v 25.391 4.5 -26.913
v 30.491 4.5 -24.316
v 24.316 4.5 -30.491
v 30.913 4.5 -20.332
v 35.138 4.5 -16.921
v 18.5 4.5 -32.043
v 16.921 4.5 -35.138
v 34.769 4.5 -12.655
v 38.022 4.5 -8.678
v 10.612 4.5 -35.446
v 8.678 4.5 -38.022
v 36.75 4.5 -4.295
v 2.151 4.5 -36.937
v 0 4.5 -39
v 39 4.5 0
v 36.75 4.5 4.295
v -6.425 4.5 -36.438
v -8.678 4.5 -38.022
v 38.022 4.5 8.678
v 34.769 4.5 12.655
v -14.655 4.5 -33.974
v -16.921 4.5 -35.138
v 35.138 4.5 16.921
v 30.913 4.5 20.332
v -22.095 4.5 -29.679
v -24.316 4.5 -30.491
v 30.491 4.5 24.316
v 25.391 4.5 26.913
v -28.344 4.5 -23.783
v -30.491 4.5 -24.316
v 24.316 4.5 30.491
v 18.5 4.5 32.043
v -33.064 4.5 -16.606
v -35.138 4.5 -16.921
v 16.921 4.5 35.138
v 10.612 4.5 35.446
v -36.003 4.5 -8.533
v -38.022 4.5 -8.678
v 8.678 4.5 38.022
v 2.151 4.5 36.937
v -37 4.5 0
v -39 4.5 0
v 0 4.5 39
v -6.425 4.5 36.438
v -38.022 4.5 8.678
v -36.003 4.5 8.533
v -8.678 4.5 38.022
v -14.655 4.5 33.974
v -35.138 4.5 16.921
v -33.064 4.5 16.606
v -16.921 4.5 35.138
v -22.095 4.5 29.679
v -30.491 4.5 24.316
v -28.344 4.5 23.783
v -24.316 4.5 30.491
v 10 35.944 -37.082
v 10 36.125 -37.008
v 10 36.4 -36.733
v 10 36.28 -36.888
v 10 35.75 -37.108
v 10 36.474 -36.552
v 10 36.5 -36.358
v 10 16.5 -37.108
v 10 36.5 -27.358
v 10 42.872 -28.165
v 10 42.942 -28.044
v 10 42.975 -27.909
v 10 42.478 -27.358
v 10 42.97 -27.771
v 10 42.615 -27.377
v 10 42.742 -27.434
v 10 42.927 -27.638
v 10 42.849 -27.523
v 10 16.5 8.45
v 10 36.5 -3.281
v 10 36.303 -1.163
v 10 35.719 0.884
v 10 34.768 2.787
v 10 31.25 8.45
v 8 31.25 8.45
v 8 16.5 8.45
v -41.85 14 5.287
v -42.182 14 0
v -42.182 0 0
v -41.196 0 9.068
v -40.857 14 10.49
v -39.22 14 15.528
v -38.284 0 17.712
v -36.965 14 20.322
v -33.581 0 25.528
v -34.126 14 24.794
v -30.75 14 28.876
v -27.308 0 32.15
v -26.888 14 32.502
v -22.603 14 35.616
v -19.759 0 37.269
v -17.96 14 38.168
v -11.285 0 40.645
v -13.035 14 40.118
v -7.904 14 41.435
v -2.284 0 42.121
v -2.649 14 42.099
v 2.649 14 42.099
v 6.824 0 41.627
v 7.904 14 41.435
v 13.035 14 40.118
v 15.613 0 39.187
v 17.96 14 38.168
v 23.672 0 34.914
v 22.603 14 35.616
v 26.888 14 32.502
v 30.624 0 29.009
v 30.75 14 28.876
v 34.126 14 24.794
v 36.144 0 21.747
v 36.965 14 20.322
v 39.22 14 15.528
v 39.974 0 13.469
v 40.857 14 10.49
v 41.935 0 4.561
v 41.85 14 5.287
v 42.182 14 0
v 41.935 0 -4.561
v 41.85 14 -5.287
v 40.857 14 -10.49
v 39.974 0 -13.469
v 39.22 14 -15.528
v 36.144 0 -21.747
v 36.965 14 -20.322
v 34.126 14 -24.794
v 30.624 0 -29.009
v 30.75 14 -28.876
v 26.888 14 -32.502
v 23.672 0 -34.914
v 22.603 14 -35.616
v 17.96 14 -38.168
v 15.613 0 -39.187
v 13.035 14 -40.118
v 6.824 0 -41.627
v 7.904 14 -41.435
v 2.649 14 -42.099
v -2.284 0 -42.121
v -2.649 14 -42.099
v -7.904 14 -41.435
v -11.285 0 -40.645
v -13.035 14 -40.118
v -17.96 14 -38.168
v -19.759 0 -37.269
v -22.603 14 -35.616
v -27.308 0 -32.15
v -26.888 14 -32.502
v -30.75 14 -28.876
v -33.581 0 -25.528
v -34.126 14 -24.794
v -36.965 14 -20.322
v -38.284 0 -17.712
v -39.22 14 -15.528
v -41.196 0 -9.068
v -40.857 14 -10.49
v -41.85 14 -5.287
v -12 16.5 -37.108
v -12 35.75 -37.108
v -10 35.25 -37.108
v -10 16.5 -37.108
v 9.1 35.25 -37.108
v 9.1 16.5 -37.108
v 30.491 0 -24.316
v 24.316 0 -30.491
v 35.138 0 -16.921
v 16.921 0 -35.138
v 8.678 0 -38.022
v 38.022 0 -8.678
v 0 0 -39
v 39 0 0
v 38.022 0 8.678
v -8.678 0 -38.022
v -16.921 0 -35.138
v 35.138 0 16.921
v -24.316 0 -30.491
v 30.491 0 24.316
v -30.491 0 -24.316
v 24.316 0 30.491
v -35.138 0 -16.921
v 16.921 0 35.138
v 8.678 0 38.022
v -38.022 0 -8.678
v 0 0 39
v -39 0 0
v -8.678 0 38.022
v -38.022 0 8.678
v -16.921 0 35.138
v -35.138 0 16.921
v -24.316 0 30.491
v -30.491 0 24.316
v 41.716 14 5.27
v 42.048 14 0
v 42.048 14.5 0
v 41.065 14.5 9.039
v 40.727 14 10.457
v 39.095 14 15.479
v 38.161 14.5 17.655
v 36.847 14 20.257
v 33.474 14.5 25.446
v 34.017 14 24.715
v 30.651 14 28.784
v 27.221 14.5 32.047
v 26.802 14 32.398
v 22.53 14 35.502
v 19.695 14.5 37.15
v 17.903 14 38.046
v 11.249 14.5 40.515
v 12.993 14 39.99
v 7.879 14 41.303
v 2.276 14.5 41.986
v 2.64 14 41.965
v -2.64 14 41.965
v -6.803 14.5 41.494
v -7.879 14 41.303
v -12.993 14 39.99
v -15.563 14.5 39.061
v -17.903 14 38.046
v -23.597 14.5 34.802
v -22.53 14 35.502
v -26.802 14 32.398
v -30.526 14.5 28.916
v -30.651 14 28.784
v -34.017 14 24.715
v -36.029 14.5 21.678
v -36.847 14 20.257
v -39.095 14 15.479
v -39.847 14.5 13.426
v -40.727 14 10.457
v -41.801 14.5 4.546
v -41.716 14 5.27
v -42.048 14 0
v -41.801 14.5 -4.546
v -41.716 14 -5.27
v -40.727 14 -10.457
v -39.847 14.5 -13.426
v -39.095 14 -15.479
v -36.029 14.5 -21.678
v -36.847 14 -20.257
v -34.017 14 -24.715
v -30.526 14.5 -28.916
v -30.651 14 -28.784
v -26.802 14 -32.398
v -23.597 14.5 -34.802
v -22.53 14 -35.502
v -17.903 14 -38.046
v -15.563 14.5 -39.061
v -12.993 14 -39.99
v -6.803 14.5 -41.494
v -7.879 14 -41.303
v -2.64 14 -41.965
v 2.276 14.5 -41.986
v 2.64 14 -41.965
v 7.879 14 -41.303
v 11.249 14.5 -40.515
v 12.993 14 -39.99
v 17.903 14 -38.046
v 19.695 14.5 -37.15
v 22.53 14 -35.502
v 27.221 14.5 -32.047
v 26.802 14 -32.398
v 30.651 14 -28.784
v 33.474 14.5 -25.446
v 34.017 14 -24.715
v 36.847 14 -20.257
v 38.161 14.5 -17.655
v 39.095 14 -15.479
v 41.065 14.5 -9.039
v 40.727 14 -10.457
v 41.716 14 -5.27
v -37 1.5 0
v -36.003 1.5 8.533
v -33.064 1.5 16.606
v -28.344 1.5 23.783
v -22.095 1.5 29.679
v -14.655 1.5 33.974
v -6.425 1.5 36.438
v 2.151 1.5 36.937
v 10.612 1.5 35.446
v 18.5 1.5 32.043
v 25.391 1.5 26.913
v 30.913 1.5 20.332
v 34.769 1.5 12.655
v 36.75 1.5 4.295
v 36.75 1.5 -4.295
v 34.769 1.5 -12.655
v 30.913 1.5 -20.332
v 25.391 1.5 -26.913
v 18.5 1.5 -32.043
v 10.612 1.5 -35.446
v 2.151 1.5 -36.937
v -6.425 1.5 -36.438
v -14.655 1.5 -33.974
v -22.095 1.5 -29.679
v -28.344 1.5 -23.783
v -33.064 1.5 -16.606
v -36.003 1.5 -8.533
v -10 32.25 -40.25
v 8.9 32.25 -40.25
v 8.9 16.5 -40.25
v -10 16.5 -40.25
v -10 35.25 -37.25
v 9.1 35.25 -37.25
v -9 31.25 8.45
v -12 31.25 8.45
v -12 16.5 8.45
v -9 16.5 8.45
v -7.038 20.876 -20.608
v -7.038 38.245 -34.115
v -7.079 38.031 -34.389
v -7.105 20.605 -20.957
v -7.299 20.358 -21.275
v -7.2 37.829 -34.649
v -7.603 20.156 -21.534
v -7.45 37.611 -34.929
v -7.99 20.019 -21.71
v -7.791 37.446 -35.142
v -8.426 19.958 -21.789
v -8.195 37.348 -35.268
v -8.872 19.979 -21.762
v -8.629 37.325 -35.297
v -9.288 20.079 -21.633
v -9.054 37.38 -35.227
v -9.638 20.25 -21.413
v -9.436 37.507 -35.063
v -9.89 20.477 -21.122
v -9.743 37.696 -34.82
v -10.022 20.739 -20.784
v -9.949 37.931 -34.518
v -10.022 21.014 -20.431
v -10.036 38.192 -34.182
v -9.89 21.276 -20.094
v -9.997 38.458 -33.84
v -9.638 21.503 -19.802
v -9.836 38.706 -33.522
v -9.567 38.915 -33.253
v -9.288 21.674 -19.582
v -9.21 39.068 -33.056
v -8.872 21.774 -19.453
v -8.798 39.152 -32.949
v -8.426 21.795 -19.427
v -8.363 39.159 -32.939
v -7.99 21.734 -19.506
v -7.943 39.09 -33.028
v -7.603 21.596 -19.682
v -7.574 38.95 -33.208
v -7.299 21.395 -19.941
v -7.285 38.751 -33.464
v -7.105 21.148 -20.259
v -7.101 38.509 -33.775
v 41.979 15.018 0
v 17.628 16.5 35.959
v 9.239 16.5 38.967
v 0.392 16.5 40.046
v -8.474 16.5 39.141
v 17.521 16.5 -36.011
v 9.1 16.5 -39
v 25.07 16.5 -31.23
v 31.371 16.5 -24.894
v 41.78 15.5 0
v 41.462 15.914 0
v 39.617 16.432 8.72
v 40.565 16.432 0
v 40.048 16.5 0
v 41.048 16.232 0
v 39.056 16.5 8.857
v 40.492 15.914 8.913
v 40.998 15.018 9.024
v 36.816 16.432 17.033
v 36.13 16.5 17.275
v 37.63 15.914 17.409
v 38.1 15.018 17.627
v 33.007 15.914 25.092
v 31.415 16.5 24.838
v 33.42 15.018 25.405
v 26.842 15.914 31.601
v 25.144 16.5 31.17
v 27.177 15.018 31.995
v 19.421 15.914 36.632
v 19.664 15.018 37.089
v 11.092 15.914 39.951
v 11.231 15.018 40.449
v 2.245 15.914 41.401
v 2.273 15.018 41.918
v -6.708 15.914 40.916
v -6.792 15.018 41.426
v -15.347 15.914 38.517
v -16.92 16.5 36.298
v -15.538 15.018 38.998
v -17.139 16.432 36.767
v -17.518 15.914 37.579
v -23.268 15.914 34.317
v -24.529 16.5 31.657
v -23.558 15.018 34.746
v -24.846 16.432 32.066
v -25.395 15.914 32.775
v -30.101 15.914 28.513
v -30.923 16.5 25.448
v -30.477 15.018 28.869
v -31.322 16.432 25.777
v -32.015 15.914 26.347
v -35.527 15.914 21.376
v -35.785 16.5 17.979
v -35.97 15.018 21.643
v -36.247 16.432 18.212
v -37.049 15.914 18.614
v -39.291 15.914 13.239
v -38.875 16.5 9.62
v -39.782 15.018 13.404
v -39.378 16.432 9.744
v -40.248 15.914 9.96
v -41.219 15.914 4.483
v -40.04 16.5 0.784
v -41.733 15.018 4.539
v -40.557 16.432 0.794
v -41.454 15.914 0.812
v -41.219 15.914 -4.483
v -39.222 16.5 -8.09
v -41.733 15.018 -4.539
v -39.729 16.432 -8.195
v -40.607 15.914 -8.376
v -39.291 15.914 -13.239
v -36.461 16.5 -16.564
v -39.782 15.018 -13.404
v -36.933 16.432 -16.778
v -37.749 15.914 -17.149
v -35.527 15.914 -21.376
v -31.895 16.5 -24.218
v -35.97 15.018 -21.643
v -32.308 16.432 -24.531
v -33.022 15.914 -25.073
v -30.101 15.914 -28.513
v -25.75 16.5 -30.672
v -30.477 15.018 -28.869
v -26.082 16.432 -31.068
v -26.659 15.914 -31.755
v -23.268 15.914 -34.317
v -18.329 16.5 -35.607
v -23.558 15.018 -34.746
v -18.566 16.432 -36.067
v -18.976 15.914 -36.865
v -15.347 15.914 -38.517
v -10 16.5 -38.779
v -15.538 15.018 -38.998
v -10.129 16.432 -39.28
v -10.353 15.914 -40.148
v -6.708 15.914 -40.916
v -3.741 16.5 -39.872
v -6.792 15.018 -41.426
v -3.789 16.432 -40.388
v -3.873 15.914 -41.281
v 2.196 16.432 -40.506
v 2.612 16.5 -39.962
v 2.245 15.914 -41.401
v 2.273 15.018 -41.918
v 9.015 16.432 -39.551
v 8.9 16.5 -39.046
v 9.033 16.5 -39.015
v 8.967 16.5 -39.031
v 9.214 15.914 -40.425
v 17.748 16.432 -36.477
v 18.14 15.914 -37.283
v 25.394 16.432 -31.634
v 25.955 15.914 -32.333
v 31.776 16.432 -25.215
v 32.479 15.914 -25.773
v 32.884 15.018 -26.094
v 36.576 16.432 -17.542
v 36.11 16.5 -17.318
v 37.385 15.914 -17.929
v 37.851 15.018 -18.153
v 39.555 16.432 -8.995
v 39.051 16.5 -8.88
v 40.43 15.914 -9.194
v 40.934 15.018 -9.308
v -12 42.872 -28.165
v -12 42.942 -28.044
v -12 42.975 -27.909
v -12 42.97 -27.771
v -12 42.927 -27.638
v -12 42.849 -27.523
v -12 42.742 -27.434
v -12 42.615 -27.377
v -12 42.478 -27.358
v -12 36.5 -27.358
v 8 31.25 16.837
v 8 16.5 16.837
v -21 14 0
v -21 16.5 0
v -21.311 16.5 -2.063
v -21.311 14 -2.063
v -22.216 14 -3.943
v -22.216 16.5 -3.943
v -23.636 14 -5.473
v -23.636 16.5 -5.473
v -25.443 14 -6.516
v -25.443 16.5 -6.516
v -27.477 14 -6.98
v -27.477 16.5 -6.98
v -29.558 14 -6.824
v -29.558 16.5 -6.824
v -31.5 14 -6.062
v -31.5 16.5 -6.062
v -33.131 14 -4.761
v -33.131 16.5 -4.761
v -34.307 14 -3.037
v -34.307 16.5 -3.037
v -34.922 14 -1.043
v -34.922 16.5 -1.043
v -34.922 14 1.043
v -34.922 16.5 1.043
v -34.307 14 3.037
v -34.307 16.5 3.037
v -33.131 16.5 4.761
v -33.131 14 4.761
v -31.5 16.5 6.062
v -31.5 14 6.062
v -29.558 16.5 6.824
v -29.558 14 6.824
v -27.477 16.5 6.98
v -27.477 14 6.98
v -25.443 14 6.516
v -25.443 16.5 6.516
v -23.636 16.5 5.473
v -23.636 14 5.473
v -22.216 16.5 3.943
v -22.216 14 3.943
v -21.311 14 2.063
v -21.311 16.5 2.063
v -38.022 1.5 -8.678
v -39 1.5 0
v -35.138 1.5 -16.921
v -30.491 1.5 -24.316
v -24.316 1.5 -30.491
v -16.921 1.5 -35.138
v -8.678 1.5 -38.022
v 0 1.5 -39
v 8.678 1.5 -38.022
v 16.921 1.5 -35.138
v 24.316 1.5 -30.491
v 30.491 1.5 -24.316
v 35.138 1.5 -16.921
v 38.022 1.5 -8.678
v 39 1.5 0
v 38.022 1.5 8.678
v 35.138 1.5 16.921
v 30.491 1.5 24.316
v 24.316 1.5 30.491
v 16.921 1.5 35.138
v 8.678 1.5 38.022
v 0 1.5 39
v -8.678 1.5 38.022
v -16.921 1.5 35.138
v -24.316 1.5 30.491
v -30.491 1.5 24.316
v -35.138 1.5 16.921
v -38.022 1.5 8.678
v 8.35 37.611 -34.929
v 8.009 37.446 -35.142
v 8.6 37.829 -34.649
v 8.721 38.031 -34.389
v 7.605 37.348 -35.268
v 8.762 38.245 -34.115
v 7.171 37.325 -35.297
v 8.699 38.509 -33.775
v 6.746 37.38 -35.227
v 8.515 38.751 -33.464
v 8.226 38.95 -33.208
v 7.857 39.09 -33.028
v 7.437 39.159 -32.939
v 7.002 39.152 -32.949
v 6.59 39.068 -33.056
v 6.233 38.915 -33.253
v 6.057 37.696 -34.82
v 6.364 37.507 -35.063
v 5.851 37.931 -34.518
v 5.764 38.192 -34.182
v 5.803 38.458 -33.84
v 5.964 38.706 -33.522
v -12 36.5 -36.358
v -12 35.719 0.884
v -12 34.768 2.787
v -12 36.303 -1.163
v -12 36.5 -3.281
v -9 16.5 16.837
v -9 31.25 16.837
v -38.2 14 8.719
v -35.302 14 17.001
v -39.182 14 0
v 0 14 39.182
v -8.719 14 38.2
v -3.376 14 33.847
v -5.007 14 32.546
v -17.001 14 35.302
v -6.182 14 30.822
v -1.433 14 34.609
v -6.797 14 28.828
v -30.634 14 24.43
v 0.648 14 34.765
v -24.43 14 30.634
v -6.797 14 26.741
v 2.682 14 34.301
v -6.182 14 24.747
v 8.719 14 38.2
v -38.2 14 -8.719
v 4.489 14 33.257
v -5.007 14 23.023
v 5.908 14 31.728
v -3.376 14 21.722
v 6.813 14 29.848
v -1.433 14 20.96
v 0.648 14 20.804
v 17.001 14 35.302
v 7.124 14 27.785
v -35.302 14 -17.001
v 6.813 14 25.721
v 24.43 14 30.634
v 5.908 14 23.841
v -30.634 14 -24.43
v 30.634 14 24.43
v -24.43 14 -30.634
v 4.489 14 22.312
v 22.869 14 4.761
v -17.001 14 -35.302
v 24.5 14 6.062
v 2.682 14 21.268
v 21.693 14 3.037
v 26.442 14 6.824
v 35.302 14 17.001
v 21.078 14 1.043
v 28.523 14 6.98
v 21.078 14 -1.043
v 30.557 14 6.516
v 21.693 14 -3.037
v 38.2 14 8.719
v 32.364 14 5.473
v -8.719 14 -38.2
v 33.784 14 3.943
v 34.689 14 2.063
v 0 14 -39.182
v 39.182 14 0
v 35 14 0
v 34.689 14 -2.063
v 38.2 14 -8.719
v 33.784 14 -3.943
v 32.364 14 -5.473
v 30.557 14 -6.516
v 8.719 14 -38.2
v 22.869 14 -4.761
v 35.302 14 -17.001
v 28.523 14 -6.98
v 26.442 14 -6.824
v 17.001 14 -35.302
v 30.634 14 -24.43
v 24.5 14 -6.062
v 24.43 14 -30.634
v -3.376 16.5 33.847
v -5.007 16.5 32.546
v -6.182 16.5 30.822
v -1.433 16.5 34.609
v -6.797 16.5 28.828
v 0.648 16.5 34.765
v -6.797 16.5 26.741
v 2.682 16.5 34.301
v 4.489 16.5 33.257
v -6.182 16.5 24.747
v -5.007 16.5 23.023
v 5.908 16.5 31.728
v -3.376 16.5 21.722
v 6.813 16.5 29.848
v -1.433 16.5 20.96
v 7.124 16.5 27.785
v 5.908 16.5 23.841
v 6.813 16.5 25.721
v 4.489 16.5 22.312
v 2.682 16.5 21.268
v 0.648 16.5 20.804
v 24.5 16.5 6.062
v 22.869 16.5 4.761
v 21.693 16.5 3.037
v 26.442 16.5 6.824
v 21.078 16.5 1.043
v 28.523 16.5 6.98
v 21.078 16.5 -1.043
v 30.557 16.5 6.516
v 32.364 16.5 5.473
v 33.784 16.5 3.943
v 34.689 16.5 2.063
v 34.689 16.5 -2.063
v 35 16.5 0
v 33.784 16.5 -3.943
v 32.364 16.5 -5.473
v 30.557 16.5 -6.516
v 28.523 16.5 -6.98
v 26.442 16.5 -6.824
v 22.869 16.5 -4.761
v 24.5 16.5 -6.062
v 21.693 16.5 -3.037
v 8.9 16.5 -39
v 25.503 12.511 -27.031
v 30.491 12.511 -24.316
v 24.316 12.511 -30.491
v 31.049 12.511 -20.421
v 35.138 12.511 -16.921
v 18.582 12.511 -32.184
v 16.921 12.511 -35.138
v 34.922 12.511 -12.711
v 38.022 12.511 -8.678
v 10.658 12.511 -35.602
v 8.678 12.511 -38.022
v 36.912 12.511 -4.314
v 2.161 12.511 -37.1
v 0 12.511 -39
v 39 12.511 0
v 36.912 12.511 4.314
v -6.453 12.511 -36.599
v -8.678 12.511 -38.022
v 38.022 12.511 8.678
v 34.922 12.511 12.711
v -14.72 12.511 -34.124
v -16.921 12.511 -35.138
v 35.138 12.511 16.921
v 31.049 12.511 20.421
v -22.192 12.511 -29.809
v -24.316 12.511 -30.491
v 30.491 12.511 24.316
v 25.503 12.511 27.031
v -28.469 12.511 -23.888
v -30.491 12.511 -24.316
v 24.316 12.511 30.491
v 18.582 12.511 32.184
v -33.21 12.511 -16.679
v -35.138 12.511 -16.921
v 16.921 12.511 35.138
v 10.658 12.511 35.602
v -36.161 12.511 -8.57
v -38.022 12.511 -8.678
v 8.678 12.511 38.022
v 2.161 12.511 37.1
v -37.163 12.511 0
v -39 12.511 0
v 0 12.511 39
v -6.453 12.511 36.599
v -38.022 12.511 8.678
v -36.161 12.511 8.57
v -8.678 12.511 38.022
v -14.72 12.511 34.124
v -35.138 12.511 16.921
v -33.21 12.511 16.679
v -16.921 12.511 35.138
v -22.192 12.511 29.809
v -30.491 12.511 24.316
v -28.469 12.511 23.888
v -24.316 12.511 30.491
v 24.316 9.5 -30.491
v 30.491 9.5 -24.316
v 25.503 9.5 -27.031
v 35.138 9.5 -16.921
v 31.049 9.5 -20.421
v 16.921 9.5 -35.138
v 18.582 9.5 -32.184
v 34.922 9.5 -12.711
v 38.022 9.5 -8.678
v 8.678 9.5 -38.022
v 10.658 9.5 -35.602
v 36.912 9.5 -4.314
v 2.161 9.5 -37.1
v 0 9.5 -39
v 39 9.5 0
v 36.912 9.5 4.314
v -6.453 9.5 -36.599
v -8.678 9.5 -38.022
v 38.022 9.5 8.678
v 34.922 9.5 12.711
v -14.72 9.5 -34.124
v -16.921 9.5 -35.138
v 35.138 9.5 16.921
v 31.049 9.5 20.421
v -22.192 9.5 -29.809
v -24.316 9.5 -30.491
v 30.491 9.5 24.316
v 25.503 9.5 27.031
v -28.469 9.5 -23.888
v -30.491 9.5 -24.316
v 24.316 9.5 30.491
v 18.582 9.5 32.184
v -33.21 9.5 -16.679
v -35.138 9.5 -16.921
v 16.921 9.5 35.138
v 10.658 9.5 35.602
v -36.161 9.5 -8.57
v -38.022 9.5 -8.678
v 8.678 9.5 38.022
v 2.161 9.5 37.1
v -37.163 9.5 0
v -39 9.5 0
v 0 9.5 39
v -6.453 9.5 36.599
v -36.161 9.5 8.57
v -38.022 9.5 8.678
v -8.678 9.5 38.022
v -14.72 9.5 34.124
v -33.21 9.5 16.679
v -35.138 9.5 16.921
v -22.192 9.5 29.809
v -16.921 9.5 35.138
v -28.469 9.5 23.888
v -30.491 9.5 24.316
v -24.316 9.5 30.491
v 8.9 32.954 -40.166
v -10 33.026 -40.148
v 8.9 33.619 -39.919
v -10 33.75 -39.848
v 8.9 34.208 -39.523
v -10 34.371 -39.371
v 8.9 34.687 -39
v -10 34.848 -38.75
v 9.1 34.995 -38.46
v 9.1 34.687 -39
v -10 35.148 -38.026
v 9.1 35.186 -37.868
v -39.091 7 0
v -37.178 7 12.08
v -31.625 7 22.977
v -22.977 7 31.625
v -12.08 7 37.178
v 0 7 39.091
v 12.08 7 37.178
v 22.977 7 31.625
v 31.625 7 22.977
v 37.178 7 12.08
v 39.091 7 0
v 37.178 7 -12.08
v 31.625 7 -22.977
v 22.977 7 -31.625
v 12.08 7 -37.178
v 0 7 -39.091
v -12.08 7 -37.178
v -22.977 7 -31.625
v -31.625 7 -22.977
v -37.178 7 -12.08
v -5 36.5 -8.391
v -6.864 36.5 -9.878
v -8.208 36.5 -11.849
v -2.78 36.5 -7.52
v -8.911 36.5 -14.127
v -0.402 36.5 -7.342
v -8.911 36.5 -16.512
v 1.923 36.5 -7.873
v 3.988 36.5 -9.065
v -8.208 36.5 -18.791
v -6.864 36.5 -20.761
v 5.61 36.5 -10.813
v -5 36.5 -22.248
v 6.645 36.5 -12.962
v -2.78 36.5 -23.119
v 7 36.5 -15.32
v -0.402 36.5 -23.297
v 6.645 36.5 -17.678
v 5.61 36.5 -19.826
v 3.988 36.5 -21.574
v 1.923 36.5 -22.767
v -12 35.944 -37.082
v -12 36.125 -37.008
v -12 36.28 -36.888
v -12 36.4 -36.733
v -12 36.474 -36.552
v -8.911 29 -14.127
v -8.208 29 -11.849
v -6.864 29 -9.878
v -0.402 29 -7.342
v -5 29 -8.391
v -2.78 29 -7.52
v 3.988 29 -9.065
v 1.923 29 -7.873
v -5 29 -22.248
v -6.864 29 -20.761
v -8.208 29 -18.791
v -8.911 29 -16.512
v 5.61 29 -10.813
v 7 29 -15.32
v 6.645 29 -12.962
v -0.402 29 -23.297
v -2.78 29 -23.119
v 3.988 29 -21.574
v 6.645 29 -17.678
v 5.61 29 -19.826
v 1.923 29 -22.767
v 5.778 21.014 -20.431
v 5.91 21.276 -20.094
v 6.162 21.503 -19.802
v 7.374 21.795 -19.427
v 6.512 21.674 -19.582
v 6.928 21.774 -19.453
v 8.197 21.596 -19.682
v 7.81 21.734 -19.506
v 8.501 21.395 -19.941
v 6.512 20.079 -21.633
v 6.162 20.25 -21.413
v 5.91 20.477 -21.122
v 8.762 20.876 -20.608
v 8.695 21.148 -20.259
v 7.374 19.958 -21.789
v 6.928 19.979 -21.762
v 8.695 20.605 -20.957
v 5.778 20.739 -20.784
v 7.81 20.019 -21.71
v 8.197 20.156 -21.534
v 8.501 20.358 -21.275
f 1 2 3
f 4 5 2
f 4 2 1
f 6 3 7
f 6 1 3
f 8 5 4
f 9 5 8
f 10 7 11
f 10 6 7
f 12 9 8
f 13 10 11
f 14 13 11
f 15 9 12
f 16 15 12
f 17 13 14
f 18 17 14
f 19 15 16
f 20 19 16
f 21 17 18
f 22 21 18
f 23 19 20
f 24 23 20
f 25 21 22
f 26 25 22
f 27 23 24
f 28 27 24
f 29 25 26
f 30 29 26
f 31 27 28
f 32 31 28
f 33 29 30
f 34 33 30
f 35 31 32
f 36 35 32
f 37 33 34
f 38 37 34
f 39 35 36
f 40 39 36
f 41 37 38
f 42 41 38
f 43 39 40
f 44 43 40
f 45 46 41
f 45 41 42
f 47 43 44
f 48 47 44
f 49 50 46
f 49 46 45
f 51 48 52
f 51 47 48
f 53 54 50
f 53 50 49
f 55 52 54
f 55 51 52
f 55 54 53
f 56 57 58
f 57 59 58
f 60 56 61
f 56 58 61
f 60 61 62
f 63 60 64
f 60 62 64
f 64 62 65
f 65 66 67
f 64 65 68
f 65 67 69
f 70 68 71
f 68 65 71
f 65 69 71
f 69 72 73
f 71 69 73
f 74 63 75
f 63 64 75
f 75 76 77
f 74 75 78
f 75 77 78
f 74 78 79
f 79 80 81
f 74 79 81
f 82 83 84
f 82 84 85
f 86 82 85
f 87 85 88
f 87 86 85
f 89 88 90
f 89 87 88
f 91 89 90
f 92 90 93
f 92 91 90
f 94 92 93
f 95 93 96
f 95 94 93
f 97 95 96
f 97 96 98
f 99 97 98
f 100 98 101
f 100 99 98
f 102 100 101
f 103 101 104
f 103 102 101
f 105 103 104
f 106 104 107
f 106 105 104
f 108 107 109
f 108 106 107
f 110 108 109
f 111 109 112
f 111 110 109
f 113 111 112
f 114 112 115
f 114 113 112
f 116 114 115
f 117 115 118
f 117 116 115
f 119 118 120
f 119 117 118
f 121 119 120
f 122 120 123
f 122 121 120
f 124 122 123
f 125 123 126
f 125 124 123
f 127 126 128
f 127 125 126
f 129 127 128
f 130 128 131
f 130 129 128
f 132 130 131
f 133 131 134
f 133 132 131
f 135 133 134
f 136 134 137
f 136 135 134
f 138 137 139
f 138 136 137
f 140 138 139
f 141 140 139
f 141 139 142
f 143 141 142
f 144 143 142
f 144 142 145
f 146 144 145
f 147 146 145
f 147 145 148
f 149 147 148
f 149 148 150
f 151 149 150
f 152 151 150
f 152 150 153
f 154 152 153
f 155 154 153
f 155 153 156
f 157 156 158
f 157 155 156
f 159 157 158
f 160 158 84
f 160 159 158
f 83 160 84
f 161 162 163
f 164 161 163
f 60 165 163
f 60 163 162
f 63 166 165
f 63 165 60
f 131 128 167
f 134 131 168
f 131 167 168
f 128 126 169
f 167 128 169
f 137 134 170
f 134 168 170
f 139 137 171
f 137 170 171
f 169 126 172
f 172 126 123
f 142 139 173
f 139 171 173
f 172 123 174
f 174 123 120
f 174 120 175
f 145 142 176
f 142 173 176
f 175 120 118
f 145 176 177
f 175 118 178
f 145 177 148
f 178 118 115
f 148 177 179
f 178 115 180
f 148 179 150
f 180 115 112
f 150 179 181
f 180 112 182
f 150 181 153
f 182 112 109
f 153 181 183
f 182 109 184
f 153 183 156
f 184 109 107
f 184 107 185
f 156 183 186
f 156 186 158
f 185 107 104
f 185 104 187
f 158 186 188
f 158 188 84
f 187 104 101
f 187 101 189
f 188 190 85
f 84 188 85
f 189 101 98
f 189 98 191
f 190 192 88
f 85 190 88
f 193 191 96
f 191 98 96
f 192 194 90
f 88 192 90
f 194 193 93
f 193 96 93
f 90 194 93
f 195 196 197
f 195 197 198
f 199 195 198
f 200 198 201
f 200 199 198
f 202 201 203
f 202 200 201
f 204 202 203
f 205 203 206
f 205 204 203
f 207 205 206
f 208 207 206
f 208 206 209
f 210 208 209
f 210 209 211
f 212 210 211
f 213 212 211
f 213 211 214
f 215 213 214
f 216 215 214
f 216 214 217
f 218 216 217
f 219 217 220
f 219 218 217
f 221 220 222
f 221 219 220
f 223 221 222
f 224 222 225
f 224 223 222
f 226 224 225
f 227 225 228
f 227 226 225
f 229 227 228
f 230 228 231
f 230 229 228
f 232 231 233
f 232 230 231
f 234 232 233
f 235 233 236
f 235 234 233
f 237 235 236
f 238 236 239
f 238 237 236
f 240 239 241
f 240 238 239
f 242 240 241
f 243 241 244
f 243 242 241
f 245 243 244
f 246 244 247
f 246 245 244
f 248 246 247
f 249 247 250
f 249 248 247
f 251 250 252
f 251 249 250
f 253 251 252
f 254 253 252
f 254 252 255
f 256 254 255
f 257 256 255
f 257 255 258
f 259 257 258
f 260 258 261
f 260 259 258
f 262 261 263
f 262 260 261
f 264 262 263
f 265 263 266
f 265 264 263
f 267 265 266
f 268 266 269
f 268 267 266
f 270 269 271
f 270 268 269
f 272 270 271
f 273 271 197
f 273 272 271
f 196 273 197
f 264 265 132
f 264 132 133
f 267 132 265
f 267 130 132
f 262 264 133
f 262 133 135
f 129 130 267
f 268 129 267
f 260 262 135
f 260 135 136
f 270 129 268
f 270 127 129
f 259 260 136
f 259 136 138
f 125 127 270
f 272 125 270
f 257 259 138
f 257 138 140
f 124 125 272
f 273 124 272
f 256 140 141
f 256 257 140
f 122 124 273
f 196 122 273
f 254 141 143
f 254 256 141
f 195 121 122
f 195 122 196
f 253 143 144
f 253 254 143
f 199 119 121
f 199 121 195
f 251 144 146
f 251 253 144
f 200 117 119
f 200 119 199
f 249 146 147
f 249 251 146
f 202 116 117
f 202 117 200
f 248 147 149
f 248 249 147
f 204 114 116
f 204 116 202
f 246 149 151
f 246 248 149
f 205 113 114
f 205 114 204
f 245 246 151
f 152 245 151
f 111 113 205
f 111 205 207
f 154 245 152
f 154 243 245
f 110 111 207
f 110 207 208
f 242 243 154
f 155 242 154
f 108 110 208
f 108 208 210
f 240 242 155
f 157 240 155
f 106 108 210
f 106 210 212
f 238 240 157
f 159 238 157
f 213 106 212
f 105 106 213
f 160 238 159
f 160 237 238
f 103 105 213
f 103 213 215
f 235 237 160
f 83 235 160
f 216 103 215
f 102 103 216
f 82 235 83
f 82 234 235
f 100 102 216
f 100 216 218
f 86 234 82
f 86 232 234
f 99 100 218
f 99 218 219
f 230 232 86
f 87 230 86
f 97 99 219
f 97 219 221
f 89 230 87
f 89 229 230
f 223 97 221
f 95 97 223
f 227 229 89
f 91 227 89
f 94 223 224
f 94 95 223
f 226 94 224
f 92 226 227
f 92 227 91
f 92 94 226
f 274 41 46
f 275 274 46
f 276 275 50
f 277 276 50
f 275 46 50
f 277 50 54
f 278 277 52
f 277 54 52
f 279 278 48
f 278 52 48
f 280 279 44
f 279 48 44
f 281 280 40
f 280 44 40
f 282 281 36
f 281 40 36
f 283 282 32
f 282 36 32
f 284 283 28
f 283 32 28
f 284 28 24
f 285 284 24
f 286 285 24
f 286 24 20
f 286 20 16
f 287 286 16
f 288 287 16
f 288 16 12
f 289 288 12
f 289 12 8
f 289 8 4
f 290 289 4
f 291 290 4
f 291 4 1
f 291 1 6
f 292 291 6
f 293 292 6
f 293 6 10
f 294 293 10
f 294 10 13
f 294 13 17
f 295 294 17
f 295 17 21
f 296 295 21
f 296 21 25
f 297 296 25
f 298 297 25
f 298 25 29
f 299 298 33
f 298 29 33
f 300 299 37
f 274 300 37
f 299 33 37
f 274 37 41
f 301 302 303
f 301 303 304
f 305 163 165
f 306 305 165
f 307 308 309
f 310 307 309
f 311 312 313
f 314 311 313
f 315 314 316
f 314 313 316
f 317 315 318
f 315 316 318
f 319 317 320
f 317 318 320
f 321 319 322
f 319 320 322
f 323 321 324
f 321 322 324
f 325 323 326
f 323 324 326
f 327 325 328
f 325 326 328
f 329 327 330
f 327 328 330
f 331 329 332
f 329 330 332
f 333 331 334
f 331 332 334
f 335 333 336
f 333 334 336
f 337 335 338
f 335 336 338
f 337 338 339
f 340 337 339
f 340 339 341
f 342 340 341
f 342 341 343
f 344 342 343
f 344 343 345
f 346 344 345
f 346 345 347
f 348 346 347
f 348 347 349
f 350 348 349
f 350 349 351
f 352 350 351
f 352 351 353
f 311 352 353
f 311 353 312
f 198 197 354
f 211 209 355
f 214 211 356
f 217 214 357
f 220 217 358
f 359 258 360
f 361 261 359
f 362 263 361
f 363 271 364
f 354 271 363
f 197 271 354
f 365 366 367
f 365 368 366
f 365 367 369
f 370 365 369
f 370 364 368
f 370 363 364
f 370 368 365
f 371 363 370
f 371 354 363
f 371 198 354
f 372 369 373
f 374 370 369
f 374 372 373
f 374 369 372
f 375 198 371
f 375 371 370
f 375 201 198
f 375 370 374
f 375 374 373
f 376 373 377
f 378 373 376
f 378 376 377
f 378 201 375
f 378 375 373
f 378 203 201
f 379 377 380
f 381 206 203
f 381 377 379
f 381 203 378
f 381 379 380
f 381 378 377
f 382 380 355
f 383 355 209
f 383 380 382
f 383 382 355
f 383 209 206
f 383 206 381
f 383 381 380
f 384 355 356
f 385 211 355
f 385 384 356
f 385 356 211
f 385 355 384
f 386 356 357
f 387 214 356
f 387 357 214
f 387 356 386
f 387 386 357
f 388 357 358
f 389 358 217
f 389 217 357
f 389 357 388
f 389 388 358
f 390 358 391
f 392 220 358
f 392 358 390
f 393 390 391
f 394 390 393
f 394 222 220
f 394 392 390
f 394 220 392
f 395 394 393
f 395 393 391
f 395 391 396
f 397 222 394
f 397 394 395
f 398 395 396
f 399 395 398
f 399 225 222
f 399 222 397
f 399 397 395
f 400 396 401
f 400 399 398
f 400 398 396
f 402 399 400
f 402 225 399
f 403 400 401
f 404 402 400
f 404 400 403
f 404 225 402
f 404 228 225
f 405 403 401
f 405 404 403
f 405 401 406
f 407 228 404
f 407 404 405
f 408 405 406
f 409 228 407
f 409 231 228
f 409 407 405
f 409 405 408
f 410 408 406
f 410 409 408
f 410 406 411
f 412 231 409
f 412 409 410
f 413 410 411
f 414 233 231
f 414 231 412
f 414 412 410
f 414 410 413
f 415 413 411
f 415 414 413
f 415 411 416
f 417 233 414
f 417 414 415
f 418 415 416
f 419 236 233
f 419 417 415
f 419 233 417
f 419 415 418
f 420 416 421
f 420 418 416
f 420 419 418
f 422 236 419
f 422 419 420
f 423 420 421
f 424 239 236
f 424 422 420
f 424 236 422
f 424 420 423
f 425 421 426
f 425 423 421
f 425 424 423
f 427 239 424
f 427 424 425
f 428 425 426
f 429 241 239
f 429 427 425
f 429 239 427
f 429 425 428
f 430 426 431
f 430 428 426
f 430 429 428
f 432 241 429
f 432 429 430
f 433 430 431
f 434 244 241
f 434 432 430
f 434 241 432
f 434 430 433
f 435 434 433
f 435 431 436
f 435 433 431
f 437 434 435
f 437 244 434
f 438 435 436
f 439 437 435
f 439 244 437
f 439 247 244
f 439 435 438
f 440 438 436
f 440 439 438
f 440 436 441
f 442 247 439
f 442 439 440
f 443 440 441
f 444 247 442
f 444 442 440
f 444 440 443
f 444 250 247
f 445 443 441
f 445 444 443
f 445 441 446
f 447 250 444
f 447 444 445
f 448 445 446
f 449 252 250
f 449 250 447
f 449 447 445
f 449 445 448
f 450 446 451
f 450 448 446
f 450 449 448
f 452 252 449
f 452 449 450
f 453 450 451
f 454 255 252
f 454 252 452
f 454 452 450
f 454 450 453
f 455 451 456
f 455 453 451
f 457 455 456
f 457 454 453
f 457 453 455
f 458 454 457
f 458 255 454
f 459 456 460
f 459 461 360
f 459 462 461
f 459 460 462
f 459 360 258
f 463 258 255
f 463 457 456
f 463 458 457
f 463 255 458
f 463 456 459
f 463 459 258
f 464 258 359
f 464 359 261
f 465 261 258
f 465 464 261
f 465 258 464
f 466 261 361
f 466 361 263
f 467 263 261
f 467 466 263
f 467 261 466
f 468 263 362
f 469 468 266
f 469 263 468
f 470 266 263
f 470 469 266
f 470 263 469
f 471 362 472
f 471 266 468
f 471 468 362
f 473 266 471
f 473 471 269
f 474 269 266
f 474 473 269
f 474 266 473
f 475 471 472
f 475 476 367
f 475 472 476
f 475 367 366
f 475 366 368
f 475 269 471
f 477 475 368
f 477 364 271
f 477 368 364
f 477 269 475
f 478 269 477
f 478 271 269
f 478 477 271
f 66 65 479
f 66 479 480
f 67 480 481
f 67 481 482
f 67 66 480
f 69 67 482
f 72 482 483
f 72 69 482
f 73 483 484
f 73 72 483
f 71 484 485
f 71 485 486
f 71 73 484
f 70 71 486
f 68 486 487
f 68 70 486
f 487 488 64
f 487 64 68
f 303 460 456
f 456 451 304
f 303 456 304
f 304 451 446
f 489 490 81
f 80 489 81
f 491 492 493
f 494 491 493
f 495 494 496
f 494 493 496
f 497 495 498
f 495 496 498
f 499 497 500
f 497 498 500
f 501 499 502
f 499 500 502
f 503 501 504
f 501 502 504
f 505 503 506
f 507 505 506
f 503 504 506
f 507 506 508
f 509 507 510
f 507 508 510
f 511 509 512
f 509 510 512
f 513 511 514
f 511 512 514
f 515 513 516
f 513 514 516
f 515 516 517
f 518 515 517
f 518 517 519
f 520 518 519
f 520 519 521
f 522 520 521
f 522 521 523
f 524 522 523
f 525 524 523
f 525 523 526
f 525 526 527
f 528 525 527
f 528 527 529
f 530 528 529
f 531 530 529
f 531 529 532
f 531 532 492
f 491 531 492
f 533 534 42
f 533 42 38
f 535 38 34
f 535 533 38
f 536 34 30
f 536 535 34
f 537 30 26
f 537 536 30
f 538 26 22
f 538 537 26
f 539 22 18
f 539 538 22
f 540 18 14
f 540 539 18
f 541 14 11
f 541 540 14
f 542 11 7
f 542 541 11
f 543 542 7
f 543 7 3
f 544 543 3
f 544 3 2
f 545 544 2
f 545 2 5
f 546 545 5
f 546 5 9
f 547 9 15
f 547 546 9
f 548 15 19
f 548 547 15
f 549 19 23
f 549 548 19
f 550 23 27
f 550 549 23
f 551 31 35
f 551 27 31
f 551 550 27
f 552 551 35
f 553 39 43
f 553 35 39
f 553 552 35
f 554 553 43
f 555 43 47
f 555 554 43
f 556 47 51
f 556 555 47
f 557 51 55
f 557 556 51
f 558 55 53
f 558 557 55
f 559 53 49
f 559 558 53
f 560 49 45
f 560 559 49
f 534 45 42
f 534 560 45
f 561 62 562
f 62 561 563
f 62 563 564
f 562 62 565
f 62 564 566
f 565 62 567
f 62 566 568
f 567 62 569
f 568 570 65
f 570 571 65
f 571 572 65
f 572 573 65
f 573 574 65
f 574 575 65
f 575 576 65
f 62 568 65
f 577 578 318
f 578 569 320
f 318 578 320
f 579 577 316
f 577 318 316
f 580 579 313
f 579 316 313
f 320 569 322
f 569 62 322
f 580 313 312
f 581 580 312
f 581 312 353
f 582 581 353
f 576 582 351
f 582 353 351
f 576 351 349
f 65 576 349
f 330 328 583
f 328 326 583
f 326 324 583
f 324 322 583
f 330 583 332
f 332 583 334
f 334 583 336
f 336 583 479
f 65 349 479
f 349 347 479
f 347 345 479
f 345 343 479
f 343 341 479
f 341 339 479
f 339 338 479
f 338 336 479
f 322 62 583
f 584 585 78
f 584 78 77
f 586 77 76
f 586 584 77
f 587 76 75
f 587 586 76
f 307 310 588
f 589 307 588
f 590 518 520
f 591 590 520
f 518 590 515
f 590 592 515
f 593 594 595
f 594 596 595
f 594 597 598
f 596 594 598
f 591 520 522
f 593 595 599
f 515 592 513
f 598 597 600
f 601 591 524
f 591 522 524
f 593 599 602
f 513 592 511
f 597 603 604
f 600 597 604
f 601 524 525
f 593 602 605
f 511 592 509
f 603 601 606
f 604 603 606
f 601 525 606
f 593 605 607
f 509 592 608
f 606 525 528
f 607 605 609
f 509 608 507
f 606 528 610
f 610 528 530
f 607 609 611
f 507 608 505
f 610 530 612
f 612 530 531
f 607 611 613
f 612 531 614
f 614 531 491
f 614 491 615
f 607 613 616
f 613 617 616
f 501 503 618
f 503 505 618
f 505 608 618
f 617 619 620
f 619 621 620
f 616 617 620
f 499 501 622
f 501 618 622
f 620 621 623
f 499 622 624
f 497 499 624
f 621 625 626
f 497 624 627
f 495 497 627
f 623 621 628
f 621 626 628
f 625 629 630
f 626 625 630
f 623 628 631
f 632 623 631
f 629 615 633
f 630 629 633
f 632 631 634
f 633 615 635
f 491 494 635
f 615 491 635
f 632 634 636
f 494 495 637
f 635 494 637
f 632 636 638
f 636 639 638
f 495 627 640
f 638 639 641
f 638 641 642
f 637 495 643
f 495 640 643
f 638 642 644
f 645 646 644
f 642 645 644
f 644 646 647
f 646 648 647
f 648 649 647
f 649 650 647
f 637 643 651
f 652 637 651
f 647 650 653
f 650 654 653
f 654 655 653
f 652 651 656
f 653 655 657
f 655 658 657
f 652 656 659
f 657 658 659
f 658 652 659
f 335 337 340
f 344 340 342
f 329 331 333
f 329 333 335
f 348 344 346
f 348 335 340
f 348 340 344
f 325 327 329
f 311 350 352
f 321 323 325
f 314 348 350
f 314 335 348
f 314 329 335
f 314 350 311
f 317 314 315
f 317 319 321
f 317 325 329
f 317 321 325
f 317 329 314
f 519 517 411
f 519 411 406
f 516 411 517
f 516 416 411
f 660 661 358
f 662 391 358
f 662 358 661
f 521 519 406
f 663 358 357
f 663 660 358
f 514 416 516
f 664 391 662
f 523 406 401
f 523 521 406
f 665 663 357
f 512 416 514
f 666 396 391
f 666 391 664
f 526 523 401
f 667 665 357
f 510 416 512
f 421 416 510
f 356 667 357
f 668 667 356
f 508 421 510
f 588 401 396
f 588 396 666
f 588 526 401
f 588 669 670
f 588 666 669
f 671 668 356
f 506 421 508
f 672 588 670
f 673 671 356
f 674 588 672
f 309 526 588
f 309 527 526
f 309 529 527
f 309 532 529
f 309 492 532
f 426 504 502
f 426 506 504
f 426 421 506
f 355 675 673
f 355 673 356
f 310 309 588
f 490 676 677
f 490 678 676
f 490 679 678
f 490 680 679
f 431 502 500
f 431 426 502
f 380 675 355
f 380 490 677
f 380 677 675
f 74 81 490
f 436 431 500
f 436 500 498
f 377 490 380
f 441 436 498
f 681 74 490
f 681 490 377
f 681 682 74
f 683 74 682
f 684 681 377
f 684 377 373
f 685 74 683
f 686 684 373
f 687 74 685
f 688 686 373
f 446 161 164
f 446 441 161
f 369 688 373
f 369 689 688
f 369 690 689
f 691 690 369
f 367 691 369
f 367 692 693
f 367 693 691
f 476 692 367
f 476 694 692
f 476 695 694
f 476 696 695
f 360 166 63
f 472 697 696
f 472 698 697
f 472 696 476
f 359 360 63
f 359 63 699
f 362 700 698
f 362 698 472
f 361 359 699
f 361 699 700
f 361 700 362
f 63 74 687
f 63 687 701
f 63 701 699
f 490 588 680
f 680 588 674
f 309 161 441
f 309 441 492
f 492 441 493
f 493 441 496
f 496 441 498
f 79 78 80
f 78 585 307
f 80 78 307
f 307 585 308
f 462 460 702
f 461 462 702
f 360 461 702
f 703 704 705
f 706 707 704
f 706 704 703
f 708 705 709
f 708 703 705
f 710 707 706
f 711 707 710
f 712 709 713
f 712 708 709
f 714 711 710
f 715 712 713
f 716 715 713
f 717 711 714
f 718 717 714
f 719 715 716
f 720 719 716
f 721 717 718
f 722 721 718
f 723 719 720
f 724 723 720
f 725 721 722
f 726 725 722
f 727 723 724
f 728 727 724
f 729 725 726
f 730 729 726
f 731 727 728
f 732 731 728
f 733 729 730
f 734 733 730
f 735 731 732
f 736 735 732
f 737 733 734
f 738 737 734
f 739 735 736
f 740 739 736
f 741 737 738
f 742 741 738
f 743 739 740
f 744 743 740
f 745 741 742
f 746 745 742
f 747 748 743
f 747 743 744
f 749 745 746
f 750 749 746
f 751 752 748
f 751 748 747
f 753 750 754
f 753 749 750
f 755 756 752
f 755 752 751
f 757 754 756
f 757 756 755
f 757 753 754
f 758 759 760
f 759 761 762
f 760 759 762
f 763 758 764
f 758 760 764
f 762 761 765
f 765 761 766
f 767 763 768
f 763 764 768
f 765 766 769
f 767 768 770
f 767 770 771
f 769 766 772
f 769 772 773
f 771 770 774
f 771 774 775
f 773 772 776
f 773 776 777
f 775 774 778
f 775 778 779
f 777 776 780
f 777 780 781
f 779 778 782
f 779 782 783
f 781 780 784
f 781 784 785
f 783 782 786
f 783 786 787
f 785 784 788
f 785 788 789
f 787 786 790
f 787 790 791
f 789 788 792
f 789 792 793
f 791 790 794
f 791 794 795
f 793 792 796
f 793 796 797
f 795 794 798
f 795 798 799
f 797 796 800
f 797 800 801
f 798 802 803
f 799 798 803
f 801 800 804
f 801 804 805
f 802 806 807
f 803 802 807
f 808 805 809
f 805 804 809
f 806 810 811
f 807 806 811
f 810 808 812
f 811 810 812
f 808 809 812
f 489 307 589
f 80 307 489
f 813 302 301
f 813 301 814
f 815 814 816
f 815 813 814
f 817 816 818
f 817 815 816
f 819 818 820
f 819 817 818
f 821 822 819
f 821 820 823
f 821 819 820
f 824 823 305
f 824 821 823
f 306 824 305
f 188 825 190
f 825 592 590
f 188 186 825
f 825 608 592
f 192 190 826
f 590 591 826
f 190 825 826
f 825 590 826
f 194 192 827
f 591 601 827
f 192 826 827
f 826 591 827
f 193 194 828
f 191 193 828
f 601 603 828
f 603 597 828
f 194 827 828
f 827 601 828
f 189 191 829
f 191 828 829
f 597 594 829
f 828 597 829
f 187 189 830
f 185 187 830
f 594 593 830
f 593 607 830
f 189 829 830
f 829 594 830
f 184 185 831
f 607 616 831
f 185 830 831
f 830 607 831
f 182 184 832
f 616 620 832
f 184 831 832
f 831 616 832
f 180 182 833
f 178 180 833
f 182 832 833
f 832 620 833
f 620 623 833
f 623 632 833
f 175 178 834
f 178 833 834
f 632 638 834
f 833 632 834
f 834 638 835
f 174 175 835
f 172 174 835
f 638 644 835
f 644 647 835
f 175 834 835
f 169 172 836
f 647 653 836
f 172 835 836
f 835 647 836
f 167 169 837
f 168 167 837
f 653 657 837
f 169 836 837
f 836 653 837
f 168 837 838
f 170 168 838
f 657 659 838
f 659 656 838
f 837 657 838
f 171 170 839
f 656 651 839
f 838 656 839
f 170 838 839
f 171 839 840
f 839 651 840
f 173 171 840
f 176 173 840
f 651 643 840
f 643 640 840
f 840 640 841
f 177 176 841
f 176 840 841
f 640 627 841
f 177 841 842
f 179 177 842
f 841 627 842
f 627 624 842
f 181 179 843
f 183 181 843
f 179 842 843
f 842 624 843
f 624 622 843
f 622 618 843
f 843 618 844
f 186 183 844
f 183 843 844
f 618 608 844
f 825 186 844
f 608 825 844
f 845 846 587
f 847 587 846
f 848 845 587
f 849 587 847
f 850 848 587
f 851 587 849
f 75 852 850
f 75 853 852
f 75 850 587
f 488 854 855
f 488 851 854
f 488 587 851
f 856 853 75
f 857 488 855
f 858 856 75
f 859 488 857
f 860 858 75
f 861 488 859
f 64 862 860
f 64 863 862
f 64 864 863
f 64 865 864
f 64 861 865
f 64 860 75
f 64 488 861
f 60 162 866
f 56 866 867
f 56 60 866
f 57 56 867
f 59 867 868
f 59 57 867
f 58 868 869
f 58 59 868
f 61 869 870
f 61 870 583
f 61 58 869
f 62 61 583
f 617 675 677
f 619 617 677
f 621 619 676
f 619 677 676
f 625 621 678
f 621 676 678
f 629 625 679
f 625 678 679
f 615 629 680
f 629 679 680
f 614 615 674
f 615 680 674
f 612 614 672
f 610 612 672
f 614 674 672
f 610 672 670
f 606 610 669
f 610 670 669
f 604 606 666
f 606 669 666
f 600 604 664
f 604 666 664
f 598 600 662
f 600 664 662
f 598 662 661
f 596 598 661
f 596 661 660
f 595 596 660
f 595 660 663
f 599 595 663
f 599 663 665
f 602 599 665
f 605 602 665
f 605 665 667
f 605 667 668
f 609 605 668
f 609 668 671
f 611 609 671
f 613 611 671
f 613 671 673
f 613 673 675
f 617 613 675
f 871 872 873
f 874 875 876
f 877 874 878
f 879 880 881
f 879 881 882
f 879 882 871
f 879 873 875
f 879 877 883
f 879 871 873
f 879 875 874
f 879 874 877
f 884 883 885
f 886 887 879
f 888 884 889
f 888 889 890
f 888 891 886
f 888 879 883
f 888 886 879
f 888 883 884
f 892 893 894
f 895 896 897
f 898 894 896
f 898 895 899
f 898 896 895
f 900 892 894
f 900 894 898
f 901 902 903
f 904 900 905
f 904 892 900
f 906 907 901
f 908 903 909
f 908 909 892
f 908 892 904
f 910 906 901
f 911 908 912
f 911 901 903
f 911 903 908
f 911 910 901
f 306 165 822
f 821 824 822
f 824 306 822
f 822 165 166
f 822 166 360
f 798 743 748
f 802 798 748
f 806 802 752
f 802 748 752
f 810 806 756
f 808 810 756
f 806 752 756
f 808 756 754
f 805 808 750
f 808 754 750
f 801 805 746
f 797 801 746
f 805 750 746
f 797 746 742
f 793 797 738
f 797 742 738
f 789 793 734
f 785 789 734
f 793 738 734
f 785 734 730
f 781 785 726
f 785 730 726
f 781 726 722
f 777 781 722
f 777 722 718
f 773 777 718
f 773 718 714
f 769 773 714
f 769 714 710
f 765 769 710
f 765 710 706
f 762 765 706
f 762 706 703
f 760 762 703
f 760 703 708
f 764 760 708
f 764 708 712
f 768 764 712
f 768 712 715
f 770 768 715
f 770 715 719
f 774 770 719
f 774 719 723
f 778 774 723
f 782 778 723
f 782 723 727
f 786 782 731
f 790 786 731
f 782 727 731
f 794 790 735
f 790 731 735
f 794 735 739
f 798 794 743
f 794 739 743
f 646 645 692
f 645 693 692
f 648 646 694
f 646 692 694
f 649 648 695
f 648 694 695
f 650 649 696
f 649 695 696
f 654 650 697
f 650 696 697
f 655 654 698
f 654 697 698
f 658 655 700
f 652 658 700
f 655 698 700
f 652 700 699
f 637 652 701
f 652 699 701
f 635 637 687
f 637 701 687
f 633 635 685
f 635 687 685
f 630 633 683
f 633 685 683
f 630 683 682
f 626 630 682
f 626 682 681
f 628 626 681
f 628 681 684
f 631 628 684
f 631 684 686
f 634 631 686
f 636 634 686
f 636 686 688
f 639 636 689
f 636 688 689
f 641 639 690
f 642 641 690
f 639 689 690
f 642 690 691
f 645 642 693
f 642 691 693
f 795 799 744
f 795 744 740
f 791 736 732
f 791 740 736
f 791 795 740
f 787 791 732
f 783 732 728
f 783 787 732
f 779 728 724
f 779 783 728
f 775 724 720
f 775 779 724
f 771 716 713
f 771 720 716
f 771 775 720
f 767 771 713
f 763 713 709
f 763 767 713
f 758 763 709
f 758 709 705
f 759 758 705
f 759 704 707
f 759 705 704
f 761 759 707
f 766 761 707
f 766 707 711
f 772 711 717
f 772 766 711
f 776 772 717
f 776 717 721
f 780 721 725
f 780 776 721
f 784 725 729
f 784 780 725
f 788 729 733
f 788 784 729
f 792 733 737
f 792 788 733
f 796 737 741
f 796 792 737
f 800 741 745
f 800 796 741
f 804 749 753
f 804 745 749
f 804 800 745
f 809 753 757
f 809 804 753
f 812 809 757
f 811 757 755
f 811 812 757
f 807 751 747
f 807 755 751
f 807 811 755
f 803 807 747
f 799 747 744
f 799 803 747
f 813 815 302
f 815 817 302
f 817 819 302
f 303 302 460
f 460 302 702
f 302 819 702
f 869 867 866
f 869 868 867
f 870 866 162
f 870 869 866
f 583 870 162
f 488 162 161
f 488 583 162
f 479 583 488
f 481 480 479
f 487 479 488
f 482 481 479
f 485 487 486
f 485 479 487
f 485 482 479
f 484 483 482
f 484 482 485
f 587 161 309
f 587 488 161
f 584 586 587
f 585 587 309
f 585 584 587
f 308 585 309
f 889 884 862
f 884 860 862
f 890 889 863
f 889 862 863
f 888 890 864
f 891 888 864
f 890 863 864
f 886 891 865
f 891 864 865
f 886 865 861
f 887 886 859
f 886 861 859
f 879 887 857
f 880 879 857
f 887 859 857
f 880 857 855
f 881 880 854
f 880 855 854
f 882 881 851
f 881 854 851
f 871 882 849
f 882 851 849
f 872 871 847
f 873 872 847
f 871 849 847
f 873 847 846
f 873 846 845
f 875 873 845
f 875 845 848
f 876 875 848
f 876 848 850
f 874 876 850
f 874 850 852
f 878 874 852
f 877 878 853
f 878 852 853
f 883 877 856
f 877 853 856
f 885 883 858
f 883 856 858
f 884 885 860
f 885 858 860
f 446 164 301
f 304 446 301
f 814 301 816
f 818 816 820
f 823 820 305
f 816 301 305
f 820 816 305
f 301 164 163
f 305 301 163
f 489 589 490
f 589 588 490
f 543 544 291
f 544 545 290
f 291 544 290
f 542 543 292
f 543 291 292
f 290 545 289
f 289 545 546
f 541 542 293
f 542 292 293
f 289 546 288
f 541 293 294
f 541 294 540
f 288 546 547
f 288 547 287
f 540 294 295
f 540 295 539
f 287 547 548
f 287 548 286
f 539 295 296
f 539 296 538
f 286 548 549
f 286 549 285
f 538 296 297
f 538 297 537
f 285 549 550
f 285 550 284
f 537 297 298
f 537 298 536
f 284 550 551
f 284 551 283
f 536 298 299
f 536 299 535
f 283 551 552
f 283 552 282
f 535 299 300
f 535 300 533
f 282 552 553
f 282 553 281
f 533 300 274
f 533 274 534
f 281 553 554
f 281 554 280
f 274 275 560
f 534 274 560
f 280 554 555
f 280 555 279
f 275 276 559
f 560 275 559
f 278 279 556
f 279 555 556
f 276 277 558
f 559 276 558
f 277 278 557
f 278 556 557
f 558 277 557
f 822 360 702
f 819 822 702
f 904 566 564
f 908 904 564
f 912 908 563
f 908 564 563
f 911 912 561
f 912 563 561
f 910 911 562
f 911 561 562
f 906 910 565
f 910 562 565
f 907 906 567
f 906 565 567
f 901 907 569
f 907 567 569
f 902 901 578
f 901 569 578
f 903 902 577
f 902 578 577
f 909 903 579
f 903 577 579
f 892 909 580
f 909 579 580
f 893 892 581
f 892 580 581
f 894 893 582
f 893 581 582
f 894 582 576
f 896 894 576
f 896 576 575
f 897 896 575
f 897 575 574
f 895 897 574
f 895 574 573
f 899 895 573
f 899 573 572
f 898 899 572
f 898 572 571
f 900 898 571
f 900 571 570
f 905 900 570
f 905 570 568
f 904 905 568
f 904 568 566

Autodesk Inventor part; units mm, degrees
ref_plane "YZ Plane" through (0, 0, 0) normal (1, 0, 0) x (0, 1, 0)
ref_plane "XZ Plane" through (0, 0, 0) normal (0, 1, 0) x (-1, 0, 0)
ref_plane "XY Plane" through (0, 0, 0) normal (0, 0, 1) x (1, 0, 0)
sketch "Sketch1" plane through (0, 0, 0) normal (0, 0, 1) x (1, 0, 0)
  line L0 (0, 0) -> (0, 14)
  line L1 (0, 14) -> (-39.1825, 14)
  line L2 (-39.1825, 14) -> (-39, 0)
  line L3 (-39.1825, 14) -> (-42.1825, 14)
  line L4 (-42.1825, 14) -> (-39, 14)
  line L5 (-39, 14) -> (-39, 0)
  line L6 (-39, 0) -> (-42.1825, 0)
  line L7 (-42.1825, 0) -> (-42.1825, 14)
  line L8 (-39, 0) -> (-39, 5)
  line L9 (-39, 5) -> (-39, 9)
  line L10 (-39, 5) -> (-39, 4.5)
  line L11 (-39, 4.5) -> (-39, 1.5)
  line L12 (-39, 9) -> (-39, 9.5)
  line L13 (-39, 9.5) -> (-39, 12.5)
  line L14 (-39.1631, 12.5112) -> (-37.1631, 12.5112)
  line L15 (-39, 4.5) -> (-37, 4.5)
  line L16 (-37.1631, 12.5112) -> (-39, 12.5112)
  line L17 (-39, 12.5112) -> (-39, 9.5)
  line L18 (-39, 9.5) -> (-37.1631, 9.5)
  line L19 (-37.1631, 9.5) -> (-37.1631, 12.5112)
  line L20 (-37, 4.5) -> (-39, 4.5)
  line L21 (-39, 4.5) -> (-39, 1.5)
  line L22 (-39, 1.5) -> (-37, 1.5)
  line L23 (-37, 1.5) -> (-37, 4.5)
  dimension "d0" = 14
  dimension "d2" = 39.1825
  dimension "d3" = 3
  dimension "d4" = 5
  dimension "d5" = 4
  dimension "d6" = 0.5
  dimension "d7" = 3
  dimension "d8" = 0.5
  dimension "d9" = 3
  dimension "d10" = 2
  dimension "d11" = 2
revolve "Revolution1" add sketch "Sketch1" angle 360 about axis through (0, 0, 0) along (0, 1, 0) contours L2 L6 L7 L3 | L14 L19 L18 L5 | L5 L15 L23 L22
sketch "Sketch2" plane through (0, 14, 0) normal (0, 1, 0) x (1, 0, 0)
  circle A0 centre (0, 0) radius 42.0476
extrude "Extrusion1" add sketch "Sketch2" along normal blind 2.5
sketch "Sketch3" plane through (0, 16.5, 0) normal (0, 1, 0) x (1, 0, 0)
  line L0 (0, 0) -> (0, -39)
  circle A0 centre (0, 0) radius 39 projected
  line L1 (0, 0) -> (10, 0)
  line L2 (0, 0) -> (-10, 0)
  line L3 (10, 0) -> (10, 33)
  line L4 (5, 0) -> (5, -8)
  line L5 (-5, 0) -> (-5, -8)
  line L6 (10, 0) -> (-12, 0)
  line L7 (-12, 0) -> (-12, 37.108)
  line L8 (-12, 37.108) -> (10, 37.108)
  line L9 (10, 37.108) -> (10, 0)
  line L10 (5, 0) -> (10, 0)
  line L11 (-5, 0) -> (-12, 0)
  line L12 (8, 0) -> (8, -8)
  line L13 (-8.5, 0) -> (-8.5, -8)
  line L14 (8, -8) -> (-9, -8)
  line L15 (-9, -8) -> (-9, -16.8367)
  line L16 (-9, -16.8367) -> (8, -16.8367)
  line L17 (8, -16.8367) -> (8, -8)
  dimension "d15" = 10
  dimension "d16" = 10
extrude "Extrusion2" add sketch "Sketch3" along normal blind 20 contours L2 L6 L7 L8 L9 L3 L1 | L14 L17 L16 L0 | L0 L16 L15 L14
sketch "Sketch4" plane through (0, 36.5, 0) normal (0, 1, 0) x (1, 0, 0)
  line L0 (-9, -8) -> (8, -8) projected
  line L1 (-9, -16.8367) -> (-9, -8) projected
  line L2 (8, -8) -> (-9, -8)
  line L3 (-9, -8) -> (-9, -16.8367)
  line L4 (-9, -16.8367) -> (8, -16.8367)
  line L5 (8, -16.8367) -> (8, -8)
  point P0 (0, 0)
extrude "Extrusion3" cut sketch "Sketch4" against normal blind 5.25
sketch "Sketch5" plane through (-12, 16.5, -37.108) normal (-1, 0, 0) x (0, 0, 1)
  line L0 (37.108, 20) -> (45.5585, 14.75)
  line L1 (45.5585, 14.75) -> (45.5585, 0)
  line L2 (37.108, 0) -> (0, 0) projected
  line L3 (45.5585, 0) -> (37.108, 0)
  line L4 (37.108, 0) -> (37.108, 20)
  point P0 (37.108, -16.5)
extrude "Extrusion4" add sketch "Sketch5" against normal blind 22
fillet "Fillet1" radius 2 1 edges at (-42.0476, 16.5, 0)
sketch "Sketch6" plane through (0, 16.5, 0) normal (0, 1, 0) x (1, 0, 0)
  circle A0 centre (0, 0) radius 40.0476 projected
  line L0 (-12, 37.108) -> (10, 37.108) projected
  line L1 (9.1, 39) -> (-10, 39)
  line L2 (-10, 39) -> (-10, 37.108)
  line L3 (-10, 37.108) -> (9.1, 37.108)
  line L4 (9.1, 37.108) -> (9.1, 39)
  line L5 (9.1, 39) -> (-10, 39)
  line L6 (-10, 39) -> (-10, 36.6014)
  line L7 (-10, 36.6014) -> (9.1, 36.6014)
  line L8 (9.1, 36.6014) -> (9.1, 39)
extrude "Extrusion5" add sketch "Sketch6" along normal blind 18.75 contours L4 L0 L2 A0 L1 | L2 L1 A0
sketch "Sketch7" plane through (-9.1, 16.5, -39) normal (0, 0, -1) x (-1, 0, 0)
  line L0 (0.9, 0) -> (0.9, 18.75) projected
  line L1 (0.9, 18.75) -> (-18, 18.75)
  line L2 (-18, 18.75) -> (-18, 0)
  line L3 (-18, 0) -> (0.9, 0)
  line L4 (0.9, 0) -> (0.9, 18.75)
  point P0 (-9.1, -16.5)
extrude "Extrusion6" add sketch "Sketch7" along normal blind 1.25
fillet "Fillet2" radius 3 1 edges at (-0.55, 35.25, -40.25)
fillet "Fillet3" radius 0.75 1 edges at (-1, 36.5, -37.108)
sketch "Sketch8" plane through (-12, 16.5, 8.4505) normal (-1, 0, 0) x (0, 0, 1)
  arc A0 (-44.8085, 20) -> (-45.5585, 19.25) centre (-44.8085, 19.25) ccw projected
  line L0 (-45.5585, 0) -> (-45.5585, 19.25) projected
  line L1 (-44.8085, 20) -> (-35.8085, 20)
  line L2 (-8.4505, 20) -> (-44.8085, 20) projected
  line L3 (-35.8085, 20) -> (-35.8085, 27)
  line L4 (-44.8085, 20) -> (-35.8085, 27)
  point P0 (-8.4505, -16.5)
  dimension "d32" = 9
  dimension "d33" = 7
extrude "Extrusion7" add sketch "Sketch8" against normal blind 22
fillet "Fillet4" radius 0.5 1 edges at (-1, 43.5, -27.358)
sketch "Sketch9" plane through (-12, 36.5, -36.358) normal (0, 0.7894, -0.6139) x (1, 0, 0)
  line L0 (21.9896, 0) -> (0, 0)
  line L1 (0, 0) -> (0, -11)
  line L2 (0, -11) -> (21.9896, -11)
  line L3 (21.9896, -11) -> (21.9896, 0)
  line L4 (0, 0) -> (22, 0) projected
  line L5 (0, -23.0909) -> (0, 12.8708) projected
  line L6 (0, -5.5) -> (21.9896, -0.3552)
  line L7 (21.9896, -5.5) -> (0, 0)
  circle A0 centre (19.2617, -2.8418) radius 1.5
  circle A1 centre (3.4617, -2.8418) radius 1.5
  point P0 (12, -6.2904)
  dimension "d41" = 3
  dimension "d42" = 3
extrude "Extrusion8" cut sketch "Sketch9" against normal blind 22 contours A0 | A1
sketch "Sketch10" plane through (0, 16.5, 0) normal (0, 1, 0) x (1, 0, 0)
  circle A0 centre (0.1244, -27.7846) radius 7
  circle A1 centre (0, 0) radius 40.0476
  circle A2 centre (24, 14) radius 7
  circle A3 centre (-24.1244, 13.7846) radius 7
  circle A4 centre (28, 0) radius 7
  circle A5 centre (-28, 0) radius 7
  dimension "d45" = 14
  dimension "d48" = 360
  dimension "d50" = 14
  dimension "d51" = 14
extrude "Extrusion9" cut sketch "Sketch10" against normal blind 22 contours A0 | A4 | A5
fillet "Fillet5" radius 11.5 1 edges at (-1, 36.5, 0)
sketch "Sketch11" plane through (0, 36.5, 0) normal (0, 1, 0) x (1, 0, 0)
  line L0 (10, 27.358) -> (-12, 27.358) projected
  line L1 (-12, -8.4505) -> (-12, 37.108) projected
  circle A0 centre (-1, 15.3197) radius 8
  point P0 (0, 0)
  point P1 (10, 3.2814)
  point P2 (-12, 3.2814)
  dimension "d56" = 16
extrude "Extrusion10" cut sketch "Sketch11" against normal blind 7.5
properties part number "UR5 Palm" material "Aluminum 6061-AHC"
